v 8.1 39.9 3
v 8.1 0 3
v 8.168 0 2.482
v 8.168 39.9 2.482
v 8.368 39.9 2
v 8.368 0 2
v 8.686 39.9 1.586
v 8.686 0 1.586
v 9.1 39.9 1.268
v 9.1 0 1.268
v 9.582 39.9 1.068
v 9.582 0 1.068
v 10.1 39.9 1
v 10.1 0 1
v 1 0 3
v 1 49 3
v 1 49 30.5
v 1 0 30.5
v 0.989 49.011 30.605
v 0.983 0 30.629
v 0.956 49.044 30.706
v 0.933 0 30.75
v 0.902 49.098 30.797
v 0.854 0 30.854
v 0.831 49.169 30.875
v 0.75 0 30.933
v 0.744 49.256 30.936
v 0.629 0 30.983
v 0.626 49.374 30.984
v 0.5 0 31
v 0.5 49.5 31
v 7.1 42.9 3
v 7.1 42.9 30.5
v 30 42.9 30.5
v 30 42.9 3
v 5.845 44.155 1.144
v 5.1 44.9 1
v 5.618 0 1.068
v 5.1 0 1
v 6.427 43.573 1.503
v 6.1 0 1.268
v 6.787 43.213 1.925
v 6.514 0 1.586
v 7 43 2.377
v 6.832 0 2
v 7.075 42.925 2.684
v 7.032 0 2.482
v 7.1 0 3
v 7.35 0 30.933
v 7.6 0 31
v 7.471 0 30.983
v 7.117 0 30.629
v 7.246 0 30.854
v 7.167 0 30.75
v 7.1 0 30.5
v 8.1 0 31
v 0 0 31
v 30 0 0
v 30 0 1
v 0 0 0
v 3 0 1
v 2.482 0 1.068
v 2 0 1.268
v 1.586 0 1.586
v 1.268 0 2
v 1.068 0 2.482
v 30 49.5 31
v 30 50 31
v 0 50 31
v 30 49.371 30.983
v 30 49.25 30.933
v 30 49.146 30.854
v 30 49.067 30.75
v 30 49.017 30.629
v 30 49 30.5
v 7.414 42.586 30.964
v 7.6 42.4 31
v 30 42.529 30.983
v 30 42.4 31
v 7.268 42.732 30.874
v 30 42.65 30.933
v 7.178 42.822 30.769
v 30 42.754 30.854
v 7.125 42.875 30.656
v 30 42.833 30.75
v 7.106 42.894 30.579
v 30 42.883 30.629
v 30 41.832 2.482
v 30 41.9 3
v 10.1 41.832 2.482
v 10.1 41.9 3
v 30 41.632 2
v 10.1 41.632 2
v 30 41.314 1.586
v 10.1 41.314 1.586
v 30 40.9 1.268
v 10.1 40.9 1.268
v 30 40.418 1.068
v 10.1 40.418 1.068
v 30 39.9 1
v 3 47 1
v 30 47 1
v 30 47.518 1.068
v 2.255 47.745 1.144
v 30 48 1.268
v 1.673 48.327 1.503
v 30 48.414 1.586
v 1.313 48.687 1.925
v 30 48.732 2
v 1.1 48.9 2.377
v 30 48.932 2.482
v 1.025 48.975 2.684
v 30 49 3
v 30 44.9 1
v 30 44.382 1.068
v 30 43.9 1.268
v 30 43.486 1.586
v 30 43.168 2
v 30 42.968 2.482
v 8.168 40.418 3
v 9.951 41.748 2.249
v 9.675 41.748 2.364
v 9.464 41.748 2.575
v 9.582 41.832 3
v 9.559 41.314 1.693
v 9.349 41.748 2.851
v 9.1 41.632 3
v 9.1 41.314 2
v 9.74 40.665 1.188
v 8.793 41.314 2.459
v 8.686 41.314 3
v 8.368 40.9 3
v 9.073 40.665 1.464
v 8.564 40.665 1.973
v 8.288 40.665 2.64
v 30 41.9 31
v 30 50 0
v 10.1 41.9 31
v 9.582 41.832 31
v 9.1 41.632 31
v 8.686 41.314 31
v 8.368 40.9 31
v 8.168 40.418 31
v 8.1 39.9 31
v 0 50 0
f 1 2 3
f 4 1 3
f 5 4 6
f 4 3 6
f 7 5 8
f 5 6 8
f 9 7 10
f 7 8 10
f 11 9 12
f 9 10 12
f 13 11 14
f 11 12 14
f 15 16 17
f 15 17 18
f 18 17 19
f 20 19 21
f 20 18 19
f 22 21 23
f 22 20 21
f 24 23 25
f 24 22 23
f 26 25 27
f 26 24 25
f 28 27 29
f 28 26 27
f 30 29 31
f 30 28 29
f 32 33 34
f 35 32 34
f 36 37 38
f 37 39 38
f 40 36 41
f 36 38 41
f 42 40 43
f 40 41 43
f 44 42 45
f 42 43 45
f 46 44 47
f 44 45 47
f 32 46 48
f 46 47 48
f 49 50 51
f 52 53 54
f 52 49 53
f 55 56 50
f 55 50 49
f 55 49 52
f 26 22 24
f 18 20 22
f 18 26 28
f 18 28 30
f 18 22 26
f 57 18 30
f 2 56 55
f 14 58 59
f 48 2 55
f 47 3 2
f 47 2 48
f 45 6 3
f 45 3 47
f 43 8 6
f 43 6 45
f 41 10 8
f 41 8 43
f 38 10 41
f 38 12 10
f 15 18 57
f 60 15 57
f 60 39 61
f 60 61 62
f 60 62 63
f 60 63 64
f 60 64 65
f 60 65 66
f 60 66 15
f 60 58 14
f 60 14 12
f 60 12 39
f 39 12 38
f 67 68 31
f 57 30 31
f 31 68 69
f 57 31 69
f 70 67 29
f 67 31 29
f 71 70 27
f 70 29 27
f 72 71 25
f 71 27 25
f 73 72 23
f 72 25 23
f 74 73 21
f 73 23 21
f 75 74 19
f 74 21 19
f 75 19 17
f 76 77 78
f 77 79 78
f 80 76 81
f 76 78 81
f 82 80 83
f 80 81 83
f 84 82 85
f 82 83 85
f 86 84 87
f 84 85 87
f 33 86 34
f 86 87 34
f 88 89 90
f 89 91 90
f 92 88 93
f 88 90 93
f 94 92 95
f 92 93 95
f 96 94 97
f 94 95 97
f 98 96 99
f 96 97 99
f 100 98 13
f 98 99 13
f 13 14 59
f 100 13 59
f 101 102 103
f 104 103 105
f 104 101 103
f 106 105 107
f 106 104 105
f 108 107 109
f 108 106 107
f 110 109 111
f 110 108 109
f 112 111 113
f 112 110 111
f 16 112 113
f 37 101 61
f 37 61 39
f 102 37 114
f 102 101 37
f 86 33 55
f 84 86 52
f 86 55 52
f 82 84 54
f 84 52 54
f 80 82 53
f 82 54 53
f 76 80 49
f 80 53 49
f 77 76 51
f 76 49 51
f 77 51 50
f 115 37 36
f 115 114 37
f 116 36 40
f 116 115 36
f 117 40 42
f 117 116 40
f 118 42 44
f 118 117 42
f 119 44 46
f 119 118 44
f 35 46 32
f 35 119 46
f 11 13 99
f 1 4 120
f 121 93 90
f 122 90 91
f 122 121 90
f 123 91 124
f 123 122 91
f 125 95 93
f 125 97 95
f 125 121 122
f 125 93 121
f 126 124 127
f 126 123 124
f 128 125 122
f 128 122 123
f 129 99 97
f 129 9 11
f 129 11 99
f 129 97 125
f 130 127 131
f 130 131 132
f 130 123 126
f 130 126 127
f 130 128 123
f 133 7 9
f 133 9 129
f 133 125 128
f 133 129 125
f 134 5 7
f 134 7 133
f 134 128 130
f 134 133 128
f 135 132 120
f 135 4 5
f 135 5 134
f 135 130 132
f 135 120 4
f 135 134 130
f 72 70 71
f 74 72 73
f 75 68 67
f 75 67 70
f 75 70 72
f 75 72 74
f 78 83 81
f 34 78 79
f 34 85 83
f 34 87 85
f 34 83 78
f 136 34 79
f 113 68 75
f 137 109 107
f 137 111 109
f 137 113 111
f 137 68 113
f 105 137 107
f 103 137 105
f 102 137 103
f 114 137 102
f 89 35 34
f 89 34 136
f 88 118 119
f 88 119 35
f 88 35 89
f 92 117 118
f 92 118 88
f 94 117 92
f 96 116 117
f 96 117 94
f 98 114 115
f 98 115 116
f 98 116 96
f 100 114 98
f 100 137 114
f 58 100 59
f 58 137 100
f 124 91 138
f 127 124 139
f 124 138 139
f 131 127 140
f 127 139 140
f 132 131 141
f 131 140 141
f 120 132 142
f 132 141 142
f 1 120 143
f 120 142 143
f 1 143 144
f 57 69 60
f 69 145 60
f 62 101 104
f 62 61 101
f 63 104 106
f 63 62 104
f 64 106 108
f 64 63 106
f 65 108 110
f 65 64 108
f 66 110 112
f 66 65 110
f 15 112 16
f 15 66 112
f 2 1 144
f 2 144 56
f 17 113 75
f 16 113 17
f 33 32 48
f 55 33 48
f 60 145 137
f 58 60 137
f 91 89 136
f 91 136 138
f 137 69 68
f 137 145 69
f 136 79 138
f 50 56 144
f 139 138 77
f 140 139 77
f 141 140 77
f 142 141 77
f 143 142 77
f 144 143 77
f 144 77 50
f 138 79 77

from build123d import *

# Parameters (mm, degrees)
SKETCH1_W           = 30
SKETCH1_H           = 50
BOSS_EXTRUDE1_DEPTH = 1
BOSS_EXTRUDE2_DEPTH = 30
FILLET1_R           = 2
FILLET2_R           = 0.5


with BuildPart() as part:
    # Sketch1 → Boss-Extrude1 (new body)
    with BuildSketch(Plane.XY):
        with Locations((15, 25)):
            Rectangle(SKETCH1_W, SKETCH1_H)
    extrude(amount=BOSS_EXTRUDE1_DEPTH)

    # Sketch2 → Boss-Extrude2 (add)
    with BuildSketch(Plane.XY.offset(1)):
        Polygon((0, 50), (30, 50), (30, 49), (1, 49), (1, 0), (0, 0), (0, 49), align=None)
        Polygon((30, 41.9), (8.1, 41.9), (8.1, 0), (7.1, 0), (7.1, 41.9), (7.1, 42.9), (30, 42.9), align=None)
    extrude(amount=BOSS_EXTRUDE2_DEPTH)

    # Fillet1
    fillet1_edges = [part.edges().sort_by_distance(p)[0] for p in [
        (1, 24.5, 1),
        (15.5, 49, 1),
        (18.55, 42.9, 1),
        (7.1, 21.45, 1),
        (8.1, 20.95, 1),
        (19.05, 41.9, 1),
        (8.1, 41.9, 16),
    ]]
    fillet(fillet1_edges, radius=FILLET1_R)

    # Fillet2
    fillet2_edges = [part.edges().sort_by_distance(p)[0] for p in [
        (1, 24.5, 31),
        (15.5, 49, 31),
        (18.55, 42.9, 31),
        (7.1, 21.45, 31),
    ]]
    fillet(fillet2_edges, radius=FILLET2_R)


solid = part.part
